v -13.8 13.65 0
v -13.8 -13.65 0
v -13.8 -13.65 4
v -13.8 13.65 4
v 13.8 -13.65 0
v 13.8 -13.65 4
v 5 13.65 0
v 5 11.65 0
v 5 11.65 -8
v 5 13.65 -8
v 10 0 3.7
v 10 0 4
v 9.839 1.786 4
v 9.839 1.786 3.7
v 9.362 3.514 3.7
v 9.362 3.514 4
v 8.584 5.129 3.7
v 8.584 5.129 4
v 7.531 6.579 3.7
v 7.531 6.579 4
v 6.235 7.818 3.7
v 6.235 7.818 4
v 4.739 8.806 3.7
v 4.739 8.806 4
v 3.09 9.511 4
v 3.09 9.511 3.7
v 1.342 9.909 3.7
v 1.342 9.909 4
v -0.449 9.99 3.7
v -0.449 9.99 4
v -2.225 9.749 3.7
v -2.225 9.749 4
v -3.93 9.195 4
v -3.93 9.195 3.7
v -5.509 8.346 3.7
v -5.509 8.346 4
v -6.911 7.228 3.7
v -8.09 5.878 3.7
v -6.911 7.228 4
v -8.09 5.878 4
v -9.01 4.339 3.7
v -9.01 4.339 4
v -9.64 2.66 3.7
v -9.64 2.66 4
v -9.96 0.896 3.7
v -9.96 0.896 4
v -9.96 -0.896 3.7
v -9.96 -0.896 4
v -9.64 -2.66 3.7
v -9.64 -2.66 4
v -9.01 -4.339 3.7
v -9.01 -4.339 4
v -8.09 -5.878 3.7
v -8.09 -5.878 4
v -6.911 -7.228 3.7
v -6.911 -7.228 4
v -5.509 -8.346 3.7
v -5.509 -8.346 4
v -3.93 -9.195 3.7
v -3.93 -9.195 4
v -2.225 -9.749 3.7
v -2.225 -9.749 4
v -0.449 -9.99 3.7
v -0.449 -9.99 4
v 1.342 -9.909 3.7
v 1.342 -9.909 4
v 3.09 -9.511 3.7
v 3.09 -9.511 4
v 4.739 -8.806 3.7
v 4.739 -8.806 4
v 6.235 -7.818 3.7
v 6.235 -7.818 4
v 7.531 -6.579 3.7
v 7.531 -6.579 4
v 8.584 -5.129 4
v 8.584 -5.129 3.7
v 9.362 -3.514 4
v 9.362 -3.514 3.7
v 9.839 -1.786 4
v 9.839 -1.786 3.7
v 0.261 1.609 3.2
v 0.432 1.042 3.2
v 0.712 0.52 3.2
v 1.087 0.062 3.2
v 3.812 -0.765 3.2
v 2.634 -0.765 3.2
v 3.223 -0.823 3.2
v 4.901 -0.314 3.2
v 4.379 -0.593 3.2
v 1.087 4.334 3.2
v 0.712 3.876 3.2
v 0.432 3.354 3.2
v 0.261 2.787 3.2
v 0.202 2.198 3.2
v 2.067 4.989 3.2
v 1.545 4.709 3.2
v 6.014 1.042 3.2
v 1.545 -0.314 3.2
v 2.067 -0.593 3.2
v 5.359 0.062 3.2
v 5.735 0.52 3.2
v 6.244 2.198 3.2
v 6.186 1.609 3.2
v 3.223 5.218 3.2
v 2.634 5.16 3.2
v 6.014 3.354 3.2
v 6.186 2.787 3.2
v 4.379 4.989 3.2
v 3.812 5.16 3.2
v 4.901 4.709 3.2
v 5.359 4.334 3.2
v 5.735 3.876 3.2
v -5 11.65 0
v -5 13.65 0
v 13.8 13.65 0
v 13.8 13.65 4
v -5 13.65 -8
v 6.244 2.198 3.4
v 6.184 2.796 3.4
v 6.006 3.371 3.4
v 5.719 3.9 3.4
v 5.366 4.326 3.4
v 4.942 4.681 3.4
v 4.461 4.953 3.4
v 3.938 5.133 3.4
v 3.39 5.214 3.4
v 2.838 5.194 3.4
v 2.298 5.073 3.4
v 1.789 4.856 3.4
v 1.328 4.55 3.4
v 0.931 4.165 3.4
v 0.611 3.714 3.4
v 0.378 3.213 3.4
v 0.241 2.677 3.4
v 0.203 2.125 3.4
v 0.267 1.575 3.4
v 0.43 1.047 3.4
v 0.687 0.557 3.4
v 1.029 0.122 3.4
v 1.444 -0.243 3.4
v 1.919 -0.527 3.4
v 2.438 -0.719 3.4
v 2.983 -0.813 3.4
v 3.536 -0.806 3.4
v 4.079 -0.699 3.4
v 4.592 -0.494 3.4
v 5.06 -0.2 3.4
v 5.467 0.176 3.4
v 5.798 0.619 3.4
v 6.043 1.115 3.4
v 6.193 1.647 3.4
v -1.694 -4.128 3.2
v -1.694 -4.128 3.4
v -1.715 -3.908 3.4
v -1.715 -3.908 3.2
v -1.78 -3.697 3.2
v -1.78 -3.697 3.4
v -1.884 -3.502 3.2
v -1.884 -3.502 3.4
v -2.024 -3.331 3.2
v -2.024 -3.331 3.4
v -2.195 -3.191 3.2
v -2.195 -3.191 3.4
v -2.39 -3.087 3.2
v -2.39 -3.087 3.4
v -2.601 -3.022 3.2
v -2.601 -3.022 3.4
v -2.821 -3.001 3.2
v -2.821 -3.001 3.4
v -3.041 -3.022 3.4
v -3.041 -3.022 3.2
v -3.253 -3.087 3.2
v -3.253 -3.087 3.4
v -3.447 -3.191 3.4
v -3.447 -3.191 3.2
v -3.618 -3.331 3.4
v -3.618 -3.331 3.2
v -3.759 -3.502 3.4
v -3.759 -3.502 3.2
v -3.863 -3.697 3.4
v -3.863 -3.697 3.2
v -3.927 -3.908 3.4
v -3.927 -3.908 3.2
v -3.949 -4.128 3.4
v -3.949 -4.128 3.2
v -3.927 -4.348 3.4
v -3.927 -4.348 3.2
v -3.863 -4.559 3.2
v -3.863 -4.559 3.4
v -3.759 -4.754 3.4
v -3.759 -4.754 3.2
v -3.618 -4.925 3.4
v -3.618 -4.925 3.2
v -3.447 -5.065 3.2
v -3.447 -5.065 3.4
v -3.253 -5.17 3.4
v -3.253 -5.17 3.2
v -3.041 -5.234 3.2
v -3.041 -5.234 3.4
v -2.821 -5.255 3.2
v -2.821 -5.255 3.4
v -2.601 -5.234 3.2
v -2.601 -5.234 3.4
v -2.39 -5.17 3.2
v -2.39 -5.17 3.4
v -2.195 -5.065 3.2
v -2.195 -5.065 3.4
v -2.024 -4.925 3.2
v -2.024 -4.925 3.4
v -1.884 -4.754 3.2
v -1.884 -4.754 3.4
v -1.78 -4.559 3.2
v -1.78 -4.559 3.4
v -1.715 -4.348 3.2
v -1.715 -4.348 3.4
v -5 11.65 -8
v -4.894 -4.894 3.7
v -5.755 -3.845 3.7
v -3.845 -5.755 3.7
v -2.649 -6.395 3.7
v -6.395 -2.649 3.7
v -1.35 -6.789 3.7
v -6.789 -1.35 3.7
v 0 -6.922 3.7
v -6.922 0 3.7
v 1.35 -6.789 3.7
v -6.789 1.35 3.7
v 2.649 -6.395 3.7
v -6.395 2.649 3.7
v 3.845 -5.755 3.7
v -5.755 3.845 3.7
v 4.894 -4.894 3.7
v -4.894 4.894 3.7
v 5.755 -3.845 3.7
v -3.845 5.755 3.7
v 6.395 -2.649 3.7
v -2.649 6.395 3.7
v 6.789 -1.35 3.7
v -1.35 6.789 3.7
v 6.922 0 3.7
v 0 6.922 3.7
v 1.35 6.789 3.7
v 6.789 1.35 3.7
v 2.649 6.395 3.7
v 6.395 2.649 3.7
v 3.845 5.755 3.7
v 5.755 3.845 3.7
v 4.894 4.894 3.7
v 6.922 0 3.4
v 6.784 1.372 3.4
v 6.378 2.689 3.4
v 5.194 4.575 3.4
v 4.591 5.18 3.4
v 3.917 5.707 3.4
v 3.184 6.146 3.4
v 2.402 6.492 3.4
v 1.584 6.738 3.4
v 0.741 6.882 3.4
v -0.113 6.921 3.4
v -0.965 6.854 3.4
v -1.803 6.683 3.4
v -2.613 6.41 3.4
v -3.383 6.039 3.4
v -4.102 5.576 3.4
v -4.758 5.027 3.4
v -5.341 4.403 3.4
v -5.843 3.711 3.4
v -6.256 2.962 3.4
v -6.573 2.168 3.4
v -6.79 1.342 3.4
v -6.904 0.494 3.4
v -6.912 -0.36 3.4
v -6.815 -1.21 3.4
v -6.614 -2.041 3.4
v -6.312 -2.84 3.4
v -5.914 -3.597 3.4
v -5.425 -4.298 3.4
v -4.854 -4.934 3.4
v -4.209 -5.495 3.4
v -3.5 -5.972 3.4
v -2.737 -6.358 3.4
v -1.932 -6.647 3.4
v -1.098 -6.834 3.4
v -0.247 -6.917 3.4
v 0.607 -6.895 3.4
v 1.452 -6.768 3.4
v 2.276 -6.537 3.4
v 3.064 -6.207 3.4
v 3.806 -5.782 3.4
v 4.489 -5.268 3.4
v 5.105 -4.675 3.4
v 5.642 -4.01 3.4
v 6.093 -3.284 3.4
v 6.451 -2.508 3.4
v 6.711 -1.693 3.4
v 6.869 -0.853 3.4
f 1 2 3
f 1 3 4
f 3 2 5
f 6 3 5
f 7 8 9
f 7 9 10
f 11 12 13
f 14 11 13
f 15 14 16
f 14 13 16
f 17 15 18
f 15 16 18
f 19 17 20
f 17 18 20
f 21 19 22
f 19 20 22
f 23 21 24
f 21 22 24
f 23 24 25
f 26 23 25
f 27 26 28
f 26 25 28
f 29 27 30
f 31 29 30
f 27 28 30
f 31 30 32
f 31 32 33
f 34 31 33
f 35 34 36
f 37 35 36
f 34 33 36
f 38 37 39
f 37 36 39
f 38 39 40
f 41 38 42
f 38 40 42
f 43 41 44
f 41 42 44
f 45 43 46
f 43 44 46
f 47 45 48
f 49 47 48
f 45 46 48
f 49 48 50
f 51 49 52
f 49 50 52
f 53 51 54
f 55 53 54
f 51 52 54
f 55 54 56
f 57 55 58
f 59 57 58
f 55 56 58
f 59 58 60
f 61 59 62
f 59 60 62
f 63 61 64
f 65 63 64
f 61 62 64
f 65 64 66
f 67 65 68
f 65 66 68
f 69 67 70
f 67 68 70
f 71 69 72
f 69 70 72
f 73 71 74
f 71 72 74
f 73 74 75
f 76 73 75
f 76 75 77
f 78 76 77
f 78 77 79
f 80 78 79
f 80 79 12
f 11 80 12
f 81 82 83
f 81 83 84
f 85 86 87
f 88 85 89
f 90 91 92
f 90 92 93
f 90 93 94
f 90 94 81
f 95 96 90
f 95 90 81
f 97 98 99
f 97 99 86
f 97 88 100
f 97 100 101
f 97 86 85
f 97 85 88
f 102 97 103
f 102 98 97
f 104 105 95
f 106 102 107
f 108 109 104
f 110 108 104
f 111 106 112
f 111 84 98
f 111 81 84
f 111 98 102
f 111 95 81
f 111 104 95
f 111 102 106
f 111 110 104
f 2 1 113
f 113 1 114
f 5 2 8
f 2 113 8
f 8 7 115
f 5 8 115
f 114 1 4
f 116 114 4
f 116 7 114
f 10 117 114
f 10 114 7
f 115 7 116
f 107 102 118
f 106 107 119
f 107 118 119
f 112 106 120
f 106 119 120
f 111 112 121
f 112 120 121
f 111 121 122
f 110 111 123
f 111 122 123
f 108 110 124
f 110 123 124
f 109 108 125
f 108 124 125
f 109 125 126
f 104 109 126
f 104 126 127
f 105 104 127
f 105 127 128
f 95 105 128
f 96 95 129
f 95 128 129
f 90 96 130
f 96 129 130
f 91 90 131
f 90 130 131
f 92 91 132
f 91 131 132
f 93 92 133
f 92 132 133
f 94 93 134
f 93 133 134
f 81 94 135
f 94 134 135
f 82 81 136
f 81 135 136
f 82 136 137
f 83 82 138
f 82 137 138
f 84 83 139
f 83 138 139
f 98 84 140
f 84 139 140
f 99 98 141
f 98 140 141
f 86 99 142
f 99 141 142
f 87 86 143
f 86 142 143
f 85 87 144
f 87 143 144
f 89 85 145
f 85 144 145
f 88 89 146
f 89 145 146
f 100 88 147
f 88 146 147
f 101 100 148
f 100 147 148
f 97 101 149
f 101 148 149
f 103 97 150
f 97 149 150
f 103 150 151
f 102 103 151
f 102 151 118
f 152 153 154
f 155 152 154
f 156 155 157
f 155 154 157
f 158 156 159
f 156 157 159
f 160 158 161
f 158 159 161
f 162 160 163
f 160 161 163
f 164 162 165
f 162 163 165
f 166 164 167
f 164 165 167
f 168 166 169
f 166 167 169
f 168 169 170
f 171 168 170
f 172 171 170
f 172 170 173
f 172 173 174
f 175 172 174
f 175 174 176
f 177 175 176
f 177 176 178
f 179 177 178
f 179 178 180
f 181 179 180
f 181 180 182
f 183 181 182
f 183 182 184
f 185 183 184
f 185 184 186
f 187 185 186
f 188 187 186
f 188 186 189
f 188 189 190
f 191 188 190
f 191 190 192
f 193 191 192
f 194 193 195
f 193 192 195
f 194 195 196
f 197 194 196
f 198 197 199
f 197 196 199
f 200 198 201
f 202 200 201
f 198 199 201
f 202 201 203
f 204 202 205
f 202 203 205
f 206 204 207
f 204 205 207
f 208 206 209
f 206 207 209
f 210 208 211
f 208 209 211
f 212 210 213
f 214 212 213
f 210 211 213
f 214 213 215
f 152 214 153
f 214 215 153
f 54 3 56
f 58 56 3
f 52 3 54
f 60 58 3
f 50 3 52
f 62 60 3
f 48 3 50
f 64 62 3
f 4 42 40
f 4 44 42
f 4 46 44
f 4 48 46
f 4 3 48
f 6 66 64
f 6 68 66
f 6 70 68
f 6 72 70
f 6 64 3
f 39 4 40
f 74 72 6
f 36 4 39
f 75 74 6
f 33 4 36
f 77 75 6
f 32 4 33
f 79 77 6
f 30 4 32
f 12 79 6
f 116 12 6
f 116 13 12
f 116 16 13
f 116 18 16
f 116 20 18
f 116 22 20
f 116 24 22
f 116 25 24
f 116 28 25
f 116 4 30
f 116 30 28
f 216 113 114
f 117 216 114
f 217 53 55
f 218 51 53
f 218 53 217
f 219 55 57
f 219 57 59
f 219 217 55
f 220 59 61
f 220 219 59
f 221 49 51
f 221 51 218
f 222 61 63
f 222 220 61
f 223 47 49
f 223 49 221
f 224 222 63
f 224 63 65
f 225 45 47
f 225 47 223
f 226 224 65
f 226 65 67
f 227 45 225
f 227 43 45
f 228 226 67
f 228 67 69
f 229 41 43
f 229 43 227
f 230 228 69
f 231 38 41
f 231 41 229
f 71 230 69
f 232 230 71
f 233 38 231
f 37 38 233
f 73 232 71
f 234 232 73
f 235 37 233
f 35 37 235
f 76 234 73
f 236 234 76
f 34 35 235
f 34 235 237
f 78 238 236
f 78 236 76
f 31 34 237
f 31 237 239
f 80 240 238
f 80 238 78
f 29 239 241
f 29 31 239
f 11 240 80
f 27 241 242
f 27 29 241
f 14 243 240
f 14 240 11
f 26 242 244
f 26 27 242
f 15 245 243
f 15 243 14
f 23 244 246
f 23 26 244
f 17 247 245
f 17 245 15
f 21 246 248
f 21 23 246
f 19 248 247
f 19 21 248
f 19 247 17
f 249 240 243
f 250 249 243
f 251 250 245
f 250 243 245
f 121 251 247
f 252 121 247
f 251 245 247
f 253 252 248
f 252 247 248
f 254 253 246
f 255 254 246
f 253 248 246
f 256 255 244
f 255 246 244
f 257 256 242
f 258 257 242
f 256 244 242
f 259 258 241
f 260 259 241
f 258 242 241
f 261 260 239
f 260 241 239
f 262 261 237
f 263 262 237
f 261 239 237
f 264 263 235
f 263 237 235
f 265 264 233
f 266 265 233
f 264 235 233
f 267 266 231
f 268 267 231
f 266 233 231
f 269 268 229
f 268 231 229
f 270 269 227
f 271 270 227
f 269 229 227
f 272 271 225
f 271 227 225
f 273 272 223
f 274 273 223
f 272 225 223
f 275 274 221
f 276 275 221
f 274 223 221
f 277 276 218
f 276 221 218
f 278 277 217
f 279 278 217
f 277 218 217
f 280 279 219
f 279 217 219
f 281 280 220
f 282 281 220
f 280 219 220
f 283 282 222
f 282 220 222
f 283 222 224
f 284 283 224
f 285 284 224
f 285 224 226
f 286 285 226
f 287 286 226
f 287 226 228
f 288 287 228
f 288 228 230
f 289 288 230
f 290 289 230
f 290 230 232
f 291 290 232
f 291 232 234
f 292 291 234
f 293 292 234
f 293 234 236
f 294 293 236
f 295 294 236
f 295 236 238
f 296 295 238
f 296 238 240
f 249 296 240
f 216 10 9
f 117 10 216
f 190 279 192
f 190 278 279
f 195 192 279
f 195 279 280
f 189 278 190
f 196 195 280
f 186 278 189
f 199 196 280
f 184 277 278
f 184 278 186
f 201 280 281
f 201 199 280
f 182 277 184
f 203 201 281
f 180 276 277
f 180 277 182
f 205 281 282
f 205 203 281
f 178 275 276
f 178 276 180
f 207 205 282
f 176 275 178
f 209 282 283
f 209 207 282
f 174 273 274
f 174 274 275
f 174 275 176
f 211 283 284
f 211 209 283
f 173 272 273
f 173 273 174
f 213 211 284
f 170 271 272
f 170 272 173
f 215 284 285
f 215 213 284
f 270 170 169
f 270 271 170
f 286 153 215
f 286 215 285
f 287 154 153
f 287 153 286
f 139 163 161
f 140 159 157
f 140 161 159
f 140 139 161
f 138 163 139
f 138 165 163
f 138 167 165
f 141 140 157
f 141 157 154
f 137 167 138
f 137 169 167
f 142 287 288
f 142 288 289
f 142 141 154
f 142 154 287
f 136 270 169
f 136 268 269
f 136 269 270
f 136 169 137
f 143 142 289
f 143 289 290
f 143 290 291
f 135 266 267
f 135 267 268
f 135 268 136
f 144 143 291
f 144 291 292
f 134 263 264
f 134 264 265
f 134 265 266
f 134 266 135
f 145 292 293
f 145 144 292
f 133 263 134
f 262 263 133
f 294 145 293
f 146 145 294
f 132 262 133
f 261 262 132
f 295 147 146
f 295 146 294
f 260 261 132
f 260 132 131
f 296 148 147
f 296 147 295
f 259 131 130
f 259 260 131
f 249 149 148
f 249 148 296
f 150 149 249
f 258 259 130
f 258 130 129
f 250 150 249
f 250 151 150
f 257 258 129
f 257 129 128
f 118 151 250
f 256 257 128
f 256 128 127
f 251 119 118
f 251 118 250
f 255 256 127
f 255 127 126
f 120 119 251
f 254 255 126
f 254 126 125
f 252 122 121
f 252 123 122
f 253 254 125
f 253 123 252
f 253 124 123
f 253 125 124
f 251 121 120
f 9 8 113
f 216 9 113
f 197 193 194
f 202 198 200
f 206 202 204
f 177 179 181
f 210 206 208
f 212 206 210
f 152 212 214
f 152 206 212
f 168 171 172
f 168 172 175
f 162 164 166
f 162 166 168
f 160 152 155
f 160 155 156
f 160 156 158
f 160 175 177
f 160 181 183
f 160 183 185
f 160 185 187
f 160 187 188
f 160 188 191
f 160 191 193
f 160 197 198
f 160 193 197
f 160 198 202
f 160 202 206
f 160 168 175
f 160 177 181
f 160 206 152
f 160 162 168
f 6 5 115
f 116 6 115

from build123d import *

# Parameters (mm, degrees)
SKETCH_1_W          = 27.6
SKETCH_1_H          = 27.3
EXTRUDE_1_DEPTH     = 4
CUT_EXTRUDE_START   = 4
SKETCH_2_R          = 10
CUT_EXTRUDE_1_DEPTH = 0.3
SKETCH_2_3_R        = 6.921661
CUT_EXTRUDE_7_DEPTH = 0.6
SKETCH_2_5_R        = 1.127346788
SKETCH_2_5_R_2      = 3.020554036
CUT_EXTRUDE_8_DEPTH = 0.8
SKETCH_3_W          = 10
SKETCH_3_H          = 2
EXTRUDE_2_DEPTH     = 8


with BuildPart() as part:
    # 草图1 → 凸台-拉伸1 (new body)
    with BuildSketch(Plane.XY):
        Rectangle(SKETCH_1_W, SKETCH_1_H)
    extrude(amount=EXTRUDE_1_DEPTH)

    # 草图2 → 切除-拉伸1 (cut)
    with BuildSketch(Plane.XY.offset(CUT_EXTRUDE_START)):
        Circle(SKETCH_2_R)
    extrude(amount=-CUT_EXTRUDE_1_DEPTH, mode=Mode.SUBTRACT)

    # 草图2<3> → 切除-拉伸7 (cut)
    with BuildSketch(Plane.XY.offset(CUT_EXTRUDE_START)):
        Circle(SKETCH_2_3_R)
    extrude(amount=-CUT_EXTRUDE_7_DEPTH, mode=Mode.SUBTRACT)

    # 草图2<5> → 切除-拉伸8 (cut)
    with BuildSketch(Plane.XY.offset(CUT_EXTRUDE_START)):
        with Locations((-2.821175222, -4.128071022)):
            Circle(SKETCH_2_5_R)
        with Locations((3.223015918, 2.197908993)):
            Circle(SKETCH_2_5_R_2)
    extrude(amount=-CUT_EXTRUDE_8_DEPTH, mode=Mode.SUBTRACT)

    # 草图3 → 凸台-拉伸2 (add)
    with BuildSketch(Plane(origin=(0, 0, 0), x_dir=(-1, 0, 0), z_dir=(0, 0, -1))):
        with Locations((0, 12.65)):
            Rectangle(SKETCH_3_W, SKETCH_3_H)
    extrude(amount=EXTRUDE_2_DEPTH)


solid = part.part
